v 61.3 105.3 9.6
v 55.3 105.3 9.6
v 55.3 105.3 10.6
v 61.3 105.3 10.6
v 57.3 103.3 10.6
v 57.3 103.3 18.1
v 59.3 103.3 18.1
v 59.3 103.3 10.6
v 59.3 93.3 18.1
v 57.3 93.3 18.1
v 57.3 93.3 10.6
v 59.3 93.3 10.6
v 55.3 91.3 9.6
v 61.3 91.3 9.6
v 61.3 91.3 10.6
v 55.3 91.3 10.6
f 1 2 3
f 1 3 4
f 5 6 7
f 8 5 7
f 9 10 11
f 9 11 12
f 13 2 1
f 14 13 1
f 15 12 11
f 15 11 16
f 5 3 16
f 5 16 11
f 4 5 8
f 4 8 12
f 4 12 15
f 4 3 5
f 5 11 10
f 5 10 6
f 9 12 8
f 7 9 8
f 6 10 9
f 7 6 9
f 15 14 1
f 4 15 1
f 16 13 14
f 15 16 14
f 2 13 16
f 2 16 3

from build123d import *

# Parameters (mm, degrees)
BOX023_W     = 2
BOX023_H     = 10
BOX023_DEPTH = 8.5
BOX025_W     = 6
BOX025_H     = 14
BOX025_DEPTH = 1


with BuildPart() as control_button_rec_c:
    # Box023 → Box023 (new body)
    with BuildSketch(Plane(origin=(57.3, 93.3, 9.6), x_dir=(1, 0, 0), z_dir=(0, 0, 1))):
        with Locations((1, 5)):
            Rectangle(BOX023_W, BOX023_H)
    extrude(amount=BOX023_DEPTH)


with BuildPart() as control_button_rec:
    # Box025 → Box025 (new body)
    with BuildSketch(Plane(origin=(55.3, 91.3, 9.6), x_dir=(1, 0, 0), z_dir=(0, 0, 1))):
        with Locations((3, 7)):
            Rectangle(BOX025_W, BOX025_H)
    extrude(amount=BOX025_DEPTH)

    # Fusion036: union control_button_rec_c
    add(control_button_rec_c.part)


solid = control_button_rec.part
